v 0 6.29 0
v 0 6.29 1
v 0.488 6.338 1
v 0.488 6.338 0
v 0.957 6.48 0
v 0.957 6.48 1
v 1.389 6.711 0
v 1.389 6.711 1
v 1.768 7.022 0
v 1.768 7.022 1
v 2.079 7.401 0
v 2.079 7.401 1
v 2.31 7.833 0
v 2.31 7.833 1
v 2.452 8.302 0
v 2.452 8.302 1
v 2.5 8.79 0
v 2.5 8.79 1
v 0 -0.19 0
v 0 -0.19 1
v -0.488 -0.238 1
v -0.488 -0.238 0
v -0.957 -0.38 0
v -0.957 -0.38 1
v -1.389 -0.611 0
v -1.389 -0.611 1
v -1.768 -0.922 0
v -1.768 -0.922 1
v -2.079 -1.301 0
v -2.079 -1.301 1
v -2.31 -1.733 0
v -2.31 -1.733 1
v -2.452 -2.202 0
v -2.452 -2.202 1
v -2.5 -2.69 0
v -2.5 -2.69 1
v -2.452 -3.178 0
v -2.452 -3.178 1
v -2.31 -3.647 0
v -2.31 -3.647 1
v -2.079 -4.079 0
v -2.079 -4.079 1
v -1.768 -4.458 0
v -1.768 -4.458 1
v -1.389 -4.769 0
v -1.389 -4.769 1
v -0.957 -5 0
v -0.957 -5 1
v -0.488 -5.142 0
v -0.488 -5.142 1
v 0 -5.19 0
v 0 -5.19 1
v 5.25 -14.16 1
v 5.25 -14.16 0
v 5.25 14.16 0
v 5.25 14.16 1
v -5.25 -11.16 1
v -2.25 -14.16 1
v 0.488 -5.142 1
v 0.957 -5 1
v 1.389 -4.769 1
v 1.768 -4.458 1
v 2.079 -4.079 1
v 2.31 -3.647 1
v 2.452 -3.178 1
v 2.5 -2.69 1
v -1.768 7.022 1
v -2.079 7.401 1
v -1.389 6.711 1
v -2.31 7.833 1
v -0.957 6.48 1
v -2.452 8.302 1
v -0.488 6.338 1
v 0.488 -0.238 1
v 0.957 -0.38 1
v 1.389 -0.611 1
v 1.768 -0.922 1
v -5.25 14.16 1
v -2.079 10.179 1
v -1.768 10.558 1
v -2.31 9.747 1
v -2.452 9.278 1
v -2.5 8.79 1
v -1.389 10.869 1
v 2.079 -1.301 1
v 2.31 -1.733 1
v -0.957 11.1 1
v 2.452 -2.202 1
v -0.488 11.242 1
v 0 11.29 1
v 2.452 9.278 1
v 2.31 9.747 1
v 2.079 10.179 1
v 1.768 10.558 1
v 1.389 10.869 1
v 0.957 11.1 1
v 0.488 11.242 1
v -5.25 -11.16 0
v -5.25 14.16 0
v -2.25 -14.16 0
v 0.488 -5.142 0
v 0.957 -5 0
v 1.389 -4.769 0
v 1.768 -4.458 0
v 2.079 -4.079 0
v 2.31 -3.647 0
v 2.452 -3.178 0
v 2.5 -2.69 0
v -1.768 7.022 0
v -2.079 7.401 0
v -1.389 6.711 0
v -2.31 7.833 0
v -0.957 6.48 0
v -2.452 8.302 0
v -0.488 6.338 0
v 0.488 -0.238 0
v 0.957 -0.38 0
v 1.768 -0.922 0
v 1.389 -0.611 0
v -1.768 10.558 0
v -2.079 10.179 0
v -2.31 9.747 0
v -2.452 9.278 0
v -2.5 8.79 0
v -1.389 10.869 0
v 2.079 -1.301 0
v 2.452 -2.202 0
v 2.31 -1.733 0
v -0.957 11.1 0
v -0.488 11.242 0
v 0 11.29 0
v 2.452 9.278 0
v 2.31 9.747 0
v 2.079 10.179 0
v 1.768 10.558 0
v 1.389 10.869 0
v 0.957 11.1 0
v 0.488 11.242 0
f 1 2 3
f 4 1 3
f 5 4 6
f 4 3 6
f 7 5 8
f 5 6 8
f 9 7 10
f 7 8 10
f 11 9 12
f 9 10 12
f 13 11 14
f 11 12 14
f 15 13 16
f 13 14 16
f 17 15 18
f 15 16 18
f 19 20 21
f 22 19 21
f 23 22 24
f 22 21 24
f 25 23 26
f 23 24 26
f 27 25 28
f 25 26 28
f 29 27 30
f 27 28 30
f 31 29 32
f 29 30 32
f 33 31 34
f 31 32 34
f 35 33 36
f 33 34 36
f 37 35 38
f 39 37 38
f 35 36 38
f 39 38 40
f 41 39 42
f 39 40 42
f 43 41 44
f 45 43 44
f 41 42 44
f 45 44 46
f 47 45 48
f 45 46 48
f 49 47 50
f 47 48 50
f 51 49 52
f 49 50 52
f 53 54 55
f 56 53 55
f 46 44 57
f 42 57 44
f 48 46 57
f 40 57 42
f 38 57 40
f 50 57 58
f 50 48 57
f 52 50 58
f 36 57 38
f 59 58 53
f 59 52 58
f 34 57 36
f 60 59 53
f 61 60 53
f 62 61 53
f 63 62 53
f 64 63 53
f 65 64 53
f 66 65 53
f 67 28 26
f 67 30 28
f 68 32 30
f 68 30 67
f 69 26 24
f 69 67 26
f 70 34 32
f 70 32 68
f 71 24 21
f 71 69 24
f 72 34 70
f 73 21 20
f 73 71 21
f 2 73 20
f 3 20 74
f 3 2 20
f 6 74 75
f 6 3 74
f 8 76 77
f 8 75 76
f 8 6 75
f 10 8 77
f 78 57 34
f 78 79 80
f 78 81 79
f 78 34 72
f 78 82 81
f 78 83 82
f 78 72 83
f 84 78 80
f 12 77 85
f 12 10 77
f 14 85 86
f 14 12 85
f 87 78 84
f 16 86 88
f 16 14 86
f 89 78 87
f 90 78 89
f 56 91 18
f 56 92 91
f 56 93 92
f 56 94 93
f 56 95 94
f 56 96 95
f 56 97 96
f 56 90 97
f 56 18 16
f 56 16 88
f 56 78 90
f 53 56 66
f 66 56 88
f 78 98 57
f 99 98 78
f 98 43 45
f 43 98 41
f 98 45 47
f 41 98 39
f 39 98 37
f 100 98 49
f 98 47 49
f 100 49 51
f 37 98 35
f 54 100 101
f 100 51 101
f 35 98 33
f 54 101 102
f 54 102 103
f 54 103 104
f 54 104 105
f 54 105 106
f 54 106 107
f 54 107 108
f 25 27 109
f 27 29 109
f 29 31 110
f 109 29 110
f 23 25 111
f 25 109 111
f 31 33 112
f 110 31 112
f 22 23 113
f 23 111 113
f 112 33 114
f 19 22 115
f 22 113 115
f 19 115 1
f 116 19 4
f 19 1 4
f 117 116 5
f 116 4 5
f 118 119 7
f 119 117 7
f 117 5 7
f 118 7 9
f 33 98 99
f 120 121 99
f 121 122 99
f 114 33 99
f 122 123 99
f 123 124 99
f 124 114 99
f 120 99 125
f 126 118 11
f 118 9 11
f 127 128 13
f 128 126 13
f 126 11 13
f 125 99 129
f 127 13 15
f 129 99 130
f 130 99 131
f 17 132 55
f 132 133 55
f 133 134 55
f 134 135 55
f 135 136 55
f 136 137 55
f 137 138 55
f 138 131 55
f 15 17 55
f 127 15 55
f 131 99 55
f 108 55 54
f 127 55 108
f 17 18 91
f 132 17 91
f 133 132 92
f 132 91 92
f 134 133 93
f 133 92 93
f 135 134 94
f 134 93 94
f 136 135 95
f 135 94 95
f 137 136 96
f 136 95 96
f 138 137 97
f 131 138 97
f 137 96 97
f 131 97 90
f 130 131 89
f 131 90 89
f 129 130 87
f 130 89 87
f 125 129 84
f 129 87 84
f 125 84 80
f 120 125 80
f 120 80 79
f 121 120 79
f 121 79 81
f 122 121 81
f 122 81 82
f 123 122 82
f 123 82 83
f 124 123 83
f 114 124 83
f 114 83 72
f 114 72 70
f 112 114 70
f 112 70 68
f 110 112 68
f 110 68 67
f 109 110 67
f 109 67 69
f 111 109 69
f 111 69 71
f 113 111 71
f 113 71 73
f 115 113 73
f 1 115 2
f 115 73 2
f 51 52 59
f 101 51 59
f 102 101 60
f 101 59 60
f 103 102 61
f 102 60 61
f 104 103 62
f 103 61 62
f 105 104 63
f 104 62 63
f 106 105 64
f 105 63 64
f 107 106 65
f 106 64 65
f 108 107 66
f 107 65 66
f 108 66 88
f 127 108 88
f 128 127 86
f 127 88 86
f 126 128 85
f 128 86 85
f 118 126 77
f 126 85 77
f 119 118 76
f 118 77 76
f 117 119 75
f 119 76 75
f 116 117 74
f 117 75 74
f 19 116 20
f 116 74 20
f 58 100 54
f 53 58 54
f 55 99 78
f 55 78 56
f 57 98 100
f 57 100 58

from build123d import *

# Parameters (mm, degrees)
F0_W     = 10.5
F0_H     = 28.32
F1_DEPTH = 1
F3_DEPTH = 1.5
F4_SIZE  = 3


with BuildPart() as f1:
    # F0 (on Top) → F1 (new body)
    with BuildSketch(Plane.XY):
        Rectangle(F0_W, F0_H)
    extrude(amount=F1_DEPTH)

    # F2 (on face) → F3 (cut)
    with BuildSketch(Plane.XY.offset(1)):
        with BuildLine():
            ThreePointArc((2.5, 8.79), (-1.767766953, 10.557766953), (0, 6.29))
            ThreePointArc((0, 6.29), (1.767766953, 7.022233047), (2.5, 8.79))
        make_face()
        with BuildLine():
            ThreePointArc((0, -0.19), (-2.5, -2.69), (0, -5.19))
            ThreePointArc((0, -5.19), (1.767766953, -4.457766953), (2.5, -2.69))
            ThreePointArc((2.5, -2.69), (1.767766953, -0.922233047), (0, -0.19))
        make_face()
    extrude(amount=-F3_DEPTH, mode=Mode.SUBTRACT)

    # F4
    f4_edges = [f1.edges().sort_by_distance(p)[0] for p in [
        (-5.25, -14.16, 0.5),
    ]]
    chamfer(f4_edges, length=F4_SIZE)


solid = f1.part
